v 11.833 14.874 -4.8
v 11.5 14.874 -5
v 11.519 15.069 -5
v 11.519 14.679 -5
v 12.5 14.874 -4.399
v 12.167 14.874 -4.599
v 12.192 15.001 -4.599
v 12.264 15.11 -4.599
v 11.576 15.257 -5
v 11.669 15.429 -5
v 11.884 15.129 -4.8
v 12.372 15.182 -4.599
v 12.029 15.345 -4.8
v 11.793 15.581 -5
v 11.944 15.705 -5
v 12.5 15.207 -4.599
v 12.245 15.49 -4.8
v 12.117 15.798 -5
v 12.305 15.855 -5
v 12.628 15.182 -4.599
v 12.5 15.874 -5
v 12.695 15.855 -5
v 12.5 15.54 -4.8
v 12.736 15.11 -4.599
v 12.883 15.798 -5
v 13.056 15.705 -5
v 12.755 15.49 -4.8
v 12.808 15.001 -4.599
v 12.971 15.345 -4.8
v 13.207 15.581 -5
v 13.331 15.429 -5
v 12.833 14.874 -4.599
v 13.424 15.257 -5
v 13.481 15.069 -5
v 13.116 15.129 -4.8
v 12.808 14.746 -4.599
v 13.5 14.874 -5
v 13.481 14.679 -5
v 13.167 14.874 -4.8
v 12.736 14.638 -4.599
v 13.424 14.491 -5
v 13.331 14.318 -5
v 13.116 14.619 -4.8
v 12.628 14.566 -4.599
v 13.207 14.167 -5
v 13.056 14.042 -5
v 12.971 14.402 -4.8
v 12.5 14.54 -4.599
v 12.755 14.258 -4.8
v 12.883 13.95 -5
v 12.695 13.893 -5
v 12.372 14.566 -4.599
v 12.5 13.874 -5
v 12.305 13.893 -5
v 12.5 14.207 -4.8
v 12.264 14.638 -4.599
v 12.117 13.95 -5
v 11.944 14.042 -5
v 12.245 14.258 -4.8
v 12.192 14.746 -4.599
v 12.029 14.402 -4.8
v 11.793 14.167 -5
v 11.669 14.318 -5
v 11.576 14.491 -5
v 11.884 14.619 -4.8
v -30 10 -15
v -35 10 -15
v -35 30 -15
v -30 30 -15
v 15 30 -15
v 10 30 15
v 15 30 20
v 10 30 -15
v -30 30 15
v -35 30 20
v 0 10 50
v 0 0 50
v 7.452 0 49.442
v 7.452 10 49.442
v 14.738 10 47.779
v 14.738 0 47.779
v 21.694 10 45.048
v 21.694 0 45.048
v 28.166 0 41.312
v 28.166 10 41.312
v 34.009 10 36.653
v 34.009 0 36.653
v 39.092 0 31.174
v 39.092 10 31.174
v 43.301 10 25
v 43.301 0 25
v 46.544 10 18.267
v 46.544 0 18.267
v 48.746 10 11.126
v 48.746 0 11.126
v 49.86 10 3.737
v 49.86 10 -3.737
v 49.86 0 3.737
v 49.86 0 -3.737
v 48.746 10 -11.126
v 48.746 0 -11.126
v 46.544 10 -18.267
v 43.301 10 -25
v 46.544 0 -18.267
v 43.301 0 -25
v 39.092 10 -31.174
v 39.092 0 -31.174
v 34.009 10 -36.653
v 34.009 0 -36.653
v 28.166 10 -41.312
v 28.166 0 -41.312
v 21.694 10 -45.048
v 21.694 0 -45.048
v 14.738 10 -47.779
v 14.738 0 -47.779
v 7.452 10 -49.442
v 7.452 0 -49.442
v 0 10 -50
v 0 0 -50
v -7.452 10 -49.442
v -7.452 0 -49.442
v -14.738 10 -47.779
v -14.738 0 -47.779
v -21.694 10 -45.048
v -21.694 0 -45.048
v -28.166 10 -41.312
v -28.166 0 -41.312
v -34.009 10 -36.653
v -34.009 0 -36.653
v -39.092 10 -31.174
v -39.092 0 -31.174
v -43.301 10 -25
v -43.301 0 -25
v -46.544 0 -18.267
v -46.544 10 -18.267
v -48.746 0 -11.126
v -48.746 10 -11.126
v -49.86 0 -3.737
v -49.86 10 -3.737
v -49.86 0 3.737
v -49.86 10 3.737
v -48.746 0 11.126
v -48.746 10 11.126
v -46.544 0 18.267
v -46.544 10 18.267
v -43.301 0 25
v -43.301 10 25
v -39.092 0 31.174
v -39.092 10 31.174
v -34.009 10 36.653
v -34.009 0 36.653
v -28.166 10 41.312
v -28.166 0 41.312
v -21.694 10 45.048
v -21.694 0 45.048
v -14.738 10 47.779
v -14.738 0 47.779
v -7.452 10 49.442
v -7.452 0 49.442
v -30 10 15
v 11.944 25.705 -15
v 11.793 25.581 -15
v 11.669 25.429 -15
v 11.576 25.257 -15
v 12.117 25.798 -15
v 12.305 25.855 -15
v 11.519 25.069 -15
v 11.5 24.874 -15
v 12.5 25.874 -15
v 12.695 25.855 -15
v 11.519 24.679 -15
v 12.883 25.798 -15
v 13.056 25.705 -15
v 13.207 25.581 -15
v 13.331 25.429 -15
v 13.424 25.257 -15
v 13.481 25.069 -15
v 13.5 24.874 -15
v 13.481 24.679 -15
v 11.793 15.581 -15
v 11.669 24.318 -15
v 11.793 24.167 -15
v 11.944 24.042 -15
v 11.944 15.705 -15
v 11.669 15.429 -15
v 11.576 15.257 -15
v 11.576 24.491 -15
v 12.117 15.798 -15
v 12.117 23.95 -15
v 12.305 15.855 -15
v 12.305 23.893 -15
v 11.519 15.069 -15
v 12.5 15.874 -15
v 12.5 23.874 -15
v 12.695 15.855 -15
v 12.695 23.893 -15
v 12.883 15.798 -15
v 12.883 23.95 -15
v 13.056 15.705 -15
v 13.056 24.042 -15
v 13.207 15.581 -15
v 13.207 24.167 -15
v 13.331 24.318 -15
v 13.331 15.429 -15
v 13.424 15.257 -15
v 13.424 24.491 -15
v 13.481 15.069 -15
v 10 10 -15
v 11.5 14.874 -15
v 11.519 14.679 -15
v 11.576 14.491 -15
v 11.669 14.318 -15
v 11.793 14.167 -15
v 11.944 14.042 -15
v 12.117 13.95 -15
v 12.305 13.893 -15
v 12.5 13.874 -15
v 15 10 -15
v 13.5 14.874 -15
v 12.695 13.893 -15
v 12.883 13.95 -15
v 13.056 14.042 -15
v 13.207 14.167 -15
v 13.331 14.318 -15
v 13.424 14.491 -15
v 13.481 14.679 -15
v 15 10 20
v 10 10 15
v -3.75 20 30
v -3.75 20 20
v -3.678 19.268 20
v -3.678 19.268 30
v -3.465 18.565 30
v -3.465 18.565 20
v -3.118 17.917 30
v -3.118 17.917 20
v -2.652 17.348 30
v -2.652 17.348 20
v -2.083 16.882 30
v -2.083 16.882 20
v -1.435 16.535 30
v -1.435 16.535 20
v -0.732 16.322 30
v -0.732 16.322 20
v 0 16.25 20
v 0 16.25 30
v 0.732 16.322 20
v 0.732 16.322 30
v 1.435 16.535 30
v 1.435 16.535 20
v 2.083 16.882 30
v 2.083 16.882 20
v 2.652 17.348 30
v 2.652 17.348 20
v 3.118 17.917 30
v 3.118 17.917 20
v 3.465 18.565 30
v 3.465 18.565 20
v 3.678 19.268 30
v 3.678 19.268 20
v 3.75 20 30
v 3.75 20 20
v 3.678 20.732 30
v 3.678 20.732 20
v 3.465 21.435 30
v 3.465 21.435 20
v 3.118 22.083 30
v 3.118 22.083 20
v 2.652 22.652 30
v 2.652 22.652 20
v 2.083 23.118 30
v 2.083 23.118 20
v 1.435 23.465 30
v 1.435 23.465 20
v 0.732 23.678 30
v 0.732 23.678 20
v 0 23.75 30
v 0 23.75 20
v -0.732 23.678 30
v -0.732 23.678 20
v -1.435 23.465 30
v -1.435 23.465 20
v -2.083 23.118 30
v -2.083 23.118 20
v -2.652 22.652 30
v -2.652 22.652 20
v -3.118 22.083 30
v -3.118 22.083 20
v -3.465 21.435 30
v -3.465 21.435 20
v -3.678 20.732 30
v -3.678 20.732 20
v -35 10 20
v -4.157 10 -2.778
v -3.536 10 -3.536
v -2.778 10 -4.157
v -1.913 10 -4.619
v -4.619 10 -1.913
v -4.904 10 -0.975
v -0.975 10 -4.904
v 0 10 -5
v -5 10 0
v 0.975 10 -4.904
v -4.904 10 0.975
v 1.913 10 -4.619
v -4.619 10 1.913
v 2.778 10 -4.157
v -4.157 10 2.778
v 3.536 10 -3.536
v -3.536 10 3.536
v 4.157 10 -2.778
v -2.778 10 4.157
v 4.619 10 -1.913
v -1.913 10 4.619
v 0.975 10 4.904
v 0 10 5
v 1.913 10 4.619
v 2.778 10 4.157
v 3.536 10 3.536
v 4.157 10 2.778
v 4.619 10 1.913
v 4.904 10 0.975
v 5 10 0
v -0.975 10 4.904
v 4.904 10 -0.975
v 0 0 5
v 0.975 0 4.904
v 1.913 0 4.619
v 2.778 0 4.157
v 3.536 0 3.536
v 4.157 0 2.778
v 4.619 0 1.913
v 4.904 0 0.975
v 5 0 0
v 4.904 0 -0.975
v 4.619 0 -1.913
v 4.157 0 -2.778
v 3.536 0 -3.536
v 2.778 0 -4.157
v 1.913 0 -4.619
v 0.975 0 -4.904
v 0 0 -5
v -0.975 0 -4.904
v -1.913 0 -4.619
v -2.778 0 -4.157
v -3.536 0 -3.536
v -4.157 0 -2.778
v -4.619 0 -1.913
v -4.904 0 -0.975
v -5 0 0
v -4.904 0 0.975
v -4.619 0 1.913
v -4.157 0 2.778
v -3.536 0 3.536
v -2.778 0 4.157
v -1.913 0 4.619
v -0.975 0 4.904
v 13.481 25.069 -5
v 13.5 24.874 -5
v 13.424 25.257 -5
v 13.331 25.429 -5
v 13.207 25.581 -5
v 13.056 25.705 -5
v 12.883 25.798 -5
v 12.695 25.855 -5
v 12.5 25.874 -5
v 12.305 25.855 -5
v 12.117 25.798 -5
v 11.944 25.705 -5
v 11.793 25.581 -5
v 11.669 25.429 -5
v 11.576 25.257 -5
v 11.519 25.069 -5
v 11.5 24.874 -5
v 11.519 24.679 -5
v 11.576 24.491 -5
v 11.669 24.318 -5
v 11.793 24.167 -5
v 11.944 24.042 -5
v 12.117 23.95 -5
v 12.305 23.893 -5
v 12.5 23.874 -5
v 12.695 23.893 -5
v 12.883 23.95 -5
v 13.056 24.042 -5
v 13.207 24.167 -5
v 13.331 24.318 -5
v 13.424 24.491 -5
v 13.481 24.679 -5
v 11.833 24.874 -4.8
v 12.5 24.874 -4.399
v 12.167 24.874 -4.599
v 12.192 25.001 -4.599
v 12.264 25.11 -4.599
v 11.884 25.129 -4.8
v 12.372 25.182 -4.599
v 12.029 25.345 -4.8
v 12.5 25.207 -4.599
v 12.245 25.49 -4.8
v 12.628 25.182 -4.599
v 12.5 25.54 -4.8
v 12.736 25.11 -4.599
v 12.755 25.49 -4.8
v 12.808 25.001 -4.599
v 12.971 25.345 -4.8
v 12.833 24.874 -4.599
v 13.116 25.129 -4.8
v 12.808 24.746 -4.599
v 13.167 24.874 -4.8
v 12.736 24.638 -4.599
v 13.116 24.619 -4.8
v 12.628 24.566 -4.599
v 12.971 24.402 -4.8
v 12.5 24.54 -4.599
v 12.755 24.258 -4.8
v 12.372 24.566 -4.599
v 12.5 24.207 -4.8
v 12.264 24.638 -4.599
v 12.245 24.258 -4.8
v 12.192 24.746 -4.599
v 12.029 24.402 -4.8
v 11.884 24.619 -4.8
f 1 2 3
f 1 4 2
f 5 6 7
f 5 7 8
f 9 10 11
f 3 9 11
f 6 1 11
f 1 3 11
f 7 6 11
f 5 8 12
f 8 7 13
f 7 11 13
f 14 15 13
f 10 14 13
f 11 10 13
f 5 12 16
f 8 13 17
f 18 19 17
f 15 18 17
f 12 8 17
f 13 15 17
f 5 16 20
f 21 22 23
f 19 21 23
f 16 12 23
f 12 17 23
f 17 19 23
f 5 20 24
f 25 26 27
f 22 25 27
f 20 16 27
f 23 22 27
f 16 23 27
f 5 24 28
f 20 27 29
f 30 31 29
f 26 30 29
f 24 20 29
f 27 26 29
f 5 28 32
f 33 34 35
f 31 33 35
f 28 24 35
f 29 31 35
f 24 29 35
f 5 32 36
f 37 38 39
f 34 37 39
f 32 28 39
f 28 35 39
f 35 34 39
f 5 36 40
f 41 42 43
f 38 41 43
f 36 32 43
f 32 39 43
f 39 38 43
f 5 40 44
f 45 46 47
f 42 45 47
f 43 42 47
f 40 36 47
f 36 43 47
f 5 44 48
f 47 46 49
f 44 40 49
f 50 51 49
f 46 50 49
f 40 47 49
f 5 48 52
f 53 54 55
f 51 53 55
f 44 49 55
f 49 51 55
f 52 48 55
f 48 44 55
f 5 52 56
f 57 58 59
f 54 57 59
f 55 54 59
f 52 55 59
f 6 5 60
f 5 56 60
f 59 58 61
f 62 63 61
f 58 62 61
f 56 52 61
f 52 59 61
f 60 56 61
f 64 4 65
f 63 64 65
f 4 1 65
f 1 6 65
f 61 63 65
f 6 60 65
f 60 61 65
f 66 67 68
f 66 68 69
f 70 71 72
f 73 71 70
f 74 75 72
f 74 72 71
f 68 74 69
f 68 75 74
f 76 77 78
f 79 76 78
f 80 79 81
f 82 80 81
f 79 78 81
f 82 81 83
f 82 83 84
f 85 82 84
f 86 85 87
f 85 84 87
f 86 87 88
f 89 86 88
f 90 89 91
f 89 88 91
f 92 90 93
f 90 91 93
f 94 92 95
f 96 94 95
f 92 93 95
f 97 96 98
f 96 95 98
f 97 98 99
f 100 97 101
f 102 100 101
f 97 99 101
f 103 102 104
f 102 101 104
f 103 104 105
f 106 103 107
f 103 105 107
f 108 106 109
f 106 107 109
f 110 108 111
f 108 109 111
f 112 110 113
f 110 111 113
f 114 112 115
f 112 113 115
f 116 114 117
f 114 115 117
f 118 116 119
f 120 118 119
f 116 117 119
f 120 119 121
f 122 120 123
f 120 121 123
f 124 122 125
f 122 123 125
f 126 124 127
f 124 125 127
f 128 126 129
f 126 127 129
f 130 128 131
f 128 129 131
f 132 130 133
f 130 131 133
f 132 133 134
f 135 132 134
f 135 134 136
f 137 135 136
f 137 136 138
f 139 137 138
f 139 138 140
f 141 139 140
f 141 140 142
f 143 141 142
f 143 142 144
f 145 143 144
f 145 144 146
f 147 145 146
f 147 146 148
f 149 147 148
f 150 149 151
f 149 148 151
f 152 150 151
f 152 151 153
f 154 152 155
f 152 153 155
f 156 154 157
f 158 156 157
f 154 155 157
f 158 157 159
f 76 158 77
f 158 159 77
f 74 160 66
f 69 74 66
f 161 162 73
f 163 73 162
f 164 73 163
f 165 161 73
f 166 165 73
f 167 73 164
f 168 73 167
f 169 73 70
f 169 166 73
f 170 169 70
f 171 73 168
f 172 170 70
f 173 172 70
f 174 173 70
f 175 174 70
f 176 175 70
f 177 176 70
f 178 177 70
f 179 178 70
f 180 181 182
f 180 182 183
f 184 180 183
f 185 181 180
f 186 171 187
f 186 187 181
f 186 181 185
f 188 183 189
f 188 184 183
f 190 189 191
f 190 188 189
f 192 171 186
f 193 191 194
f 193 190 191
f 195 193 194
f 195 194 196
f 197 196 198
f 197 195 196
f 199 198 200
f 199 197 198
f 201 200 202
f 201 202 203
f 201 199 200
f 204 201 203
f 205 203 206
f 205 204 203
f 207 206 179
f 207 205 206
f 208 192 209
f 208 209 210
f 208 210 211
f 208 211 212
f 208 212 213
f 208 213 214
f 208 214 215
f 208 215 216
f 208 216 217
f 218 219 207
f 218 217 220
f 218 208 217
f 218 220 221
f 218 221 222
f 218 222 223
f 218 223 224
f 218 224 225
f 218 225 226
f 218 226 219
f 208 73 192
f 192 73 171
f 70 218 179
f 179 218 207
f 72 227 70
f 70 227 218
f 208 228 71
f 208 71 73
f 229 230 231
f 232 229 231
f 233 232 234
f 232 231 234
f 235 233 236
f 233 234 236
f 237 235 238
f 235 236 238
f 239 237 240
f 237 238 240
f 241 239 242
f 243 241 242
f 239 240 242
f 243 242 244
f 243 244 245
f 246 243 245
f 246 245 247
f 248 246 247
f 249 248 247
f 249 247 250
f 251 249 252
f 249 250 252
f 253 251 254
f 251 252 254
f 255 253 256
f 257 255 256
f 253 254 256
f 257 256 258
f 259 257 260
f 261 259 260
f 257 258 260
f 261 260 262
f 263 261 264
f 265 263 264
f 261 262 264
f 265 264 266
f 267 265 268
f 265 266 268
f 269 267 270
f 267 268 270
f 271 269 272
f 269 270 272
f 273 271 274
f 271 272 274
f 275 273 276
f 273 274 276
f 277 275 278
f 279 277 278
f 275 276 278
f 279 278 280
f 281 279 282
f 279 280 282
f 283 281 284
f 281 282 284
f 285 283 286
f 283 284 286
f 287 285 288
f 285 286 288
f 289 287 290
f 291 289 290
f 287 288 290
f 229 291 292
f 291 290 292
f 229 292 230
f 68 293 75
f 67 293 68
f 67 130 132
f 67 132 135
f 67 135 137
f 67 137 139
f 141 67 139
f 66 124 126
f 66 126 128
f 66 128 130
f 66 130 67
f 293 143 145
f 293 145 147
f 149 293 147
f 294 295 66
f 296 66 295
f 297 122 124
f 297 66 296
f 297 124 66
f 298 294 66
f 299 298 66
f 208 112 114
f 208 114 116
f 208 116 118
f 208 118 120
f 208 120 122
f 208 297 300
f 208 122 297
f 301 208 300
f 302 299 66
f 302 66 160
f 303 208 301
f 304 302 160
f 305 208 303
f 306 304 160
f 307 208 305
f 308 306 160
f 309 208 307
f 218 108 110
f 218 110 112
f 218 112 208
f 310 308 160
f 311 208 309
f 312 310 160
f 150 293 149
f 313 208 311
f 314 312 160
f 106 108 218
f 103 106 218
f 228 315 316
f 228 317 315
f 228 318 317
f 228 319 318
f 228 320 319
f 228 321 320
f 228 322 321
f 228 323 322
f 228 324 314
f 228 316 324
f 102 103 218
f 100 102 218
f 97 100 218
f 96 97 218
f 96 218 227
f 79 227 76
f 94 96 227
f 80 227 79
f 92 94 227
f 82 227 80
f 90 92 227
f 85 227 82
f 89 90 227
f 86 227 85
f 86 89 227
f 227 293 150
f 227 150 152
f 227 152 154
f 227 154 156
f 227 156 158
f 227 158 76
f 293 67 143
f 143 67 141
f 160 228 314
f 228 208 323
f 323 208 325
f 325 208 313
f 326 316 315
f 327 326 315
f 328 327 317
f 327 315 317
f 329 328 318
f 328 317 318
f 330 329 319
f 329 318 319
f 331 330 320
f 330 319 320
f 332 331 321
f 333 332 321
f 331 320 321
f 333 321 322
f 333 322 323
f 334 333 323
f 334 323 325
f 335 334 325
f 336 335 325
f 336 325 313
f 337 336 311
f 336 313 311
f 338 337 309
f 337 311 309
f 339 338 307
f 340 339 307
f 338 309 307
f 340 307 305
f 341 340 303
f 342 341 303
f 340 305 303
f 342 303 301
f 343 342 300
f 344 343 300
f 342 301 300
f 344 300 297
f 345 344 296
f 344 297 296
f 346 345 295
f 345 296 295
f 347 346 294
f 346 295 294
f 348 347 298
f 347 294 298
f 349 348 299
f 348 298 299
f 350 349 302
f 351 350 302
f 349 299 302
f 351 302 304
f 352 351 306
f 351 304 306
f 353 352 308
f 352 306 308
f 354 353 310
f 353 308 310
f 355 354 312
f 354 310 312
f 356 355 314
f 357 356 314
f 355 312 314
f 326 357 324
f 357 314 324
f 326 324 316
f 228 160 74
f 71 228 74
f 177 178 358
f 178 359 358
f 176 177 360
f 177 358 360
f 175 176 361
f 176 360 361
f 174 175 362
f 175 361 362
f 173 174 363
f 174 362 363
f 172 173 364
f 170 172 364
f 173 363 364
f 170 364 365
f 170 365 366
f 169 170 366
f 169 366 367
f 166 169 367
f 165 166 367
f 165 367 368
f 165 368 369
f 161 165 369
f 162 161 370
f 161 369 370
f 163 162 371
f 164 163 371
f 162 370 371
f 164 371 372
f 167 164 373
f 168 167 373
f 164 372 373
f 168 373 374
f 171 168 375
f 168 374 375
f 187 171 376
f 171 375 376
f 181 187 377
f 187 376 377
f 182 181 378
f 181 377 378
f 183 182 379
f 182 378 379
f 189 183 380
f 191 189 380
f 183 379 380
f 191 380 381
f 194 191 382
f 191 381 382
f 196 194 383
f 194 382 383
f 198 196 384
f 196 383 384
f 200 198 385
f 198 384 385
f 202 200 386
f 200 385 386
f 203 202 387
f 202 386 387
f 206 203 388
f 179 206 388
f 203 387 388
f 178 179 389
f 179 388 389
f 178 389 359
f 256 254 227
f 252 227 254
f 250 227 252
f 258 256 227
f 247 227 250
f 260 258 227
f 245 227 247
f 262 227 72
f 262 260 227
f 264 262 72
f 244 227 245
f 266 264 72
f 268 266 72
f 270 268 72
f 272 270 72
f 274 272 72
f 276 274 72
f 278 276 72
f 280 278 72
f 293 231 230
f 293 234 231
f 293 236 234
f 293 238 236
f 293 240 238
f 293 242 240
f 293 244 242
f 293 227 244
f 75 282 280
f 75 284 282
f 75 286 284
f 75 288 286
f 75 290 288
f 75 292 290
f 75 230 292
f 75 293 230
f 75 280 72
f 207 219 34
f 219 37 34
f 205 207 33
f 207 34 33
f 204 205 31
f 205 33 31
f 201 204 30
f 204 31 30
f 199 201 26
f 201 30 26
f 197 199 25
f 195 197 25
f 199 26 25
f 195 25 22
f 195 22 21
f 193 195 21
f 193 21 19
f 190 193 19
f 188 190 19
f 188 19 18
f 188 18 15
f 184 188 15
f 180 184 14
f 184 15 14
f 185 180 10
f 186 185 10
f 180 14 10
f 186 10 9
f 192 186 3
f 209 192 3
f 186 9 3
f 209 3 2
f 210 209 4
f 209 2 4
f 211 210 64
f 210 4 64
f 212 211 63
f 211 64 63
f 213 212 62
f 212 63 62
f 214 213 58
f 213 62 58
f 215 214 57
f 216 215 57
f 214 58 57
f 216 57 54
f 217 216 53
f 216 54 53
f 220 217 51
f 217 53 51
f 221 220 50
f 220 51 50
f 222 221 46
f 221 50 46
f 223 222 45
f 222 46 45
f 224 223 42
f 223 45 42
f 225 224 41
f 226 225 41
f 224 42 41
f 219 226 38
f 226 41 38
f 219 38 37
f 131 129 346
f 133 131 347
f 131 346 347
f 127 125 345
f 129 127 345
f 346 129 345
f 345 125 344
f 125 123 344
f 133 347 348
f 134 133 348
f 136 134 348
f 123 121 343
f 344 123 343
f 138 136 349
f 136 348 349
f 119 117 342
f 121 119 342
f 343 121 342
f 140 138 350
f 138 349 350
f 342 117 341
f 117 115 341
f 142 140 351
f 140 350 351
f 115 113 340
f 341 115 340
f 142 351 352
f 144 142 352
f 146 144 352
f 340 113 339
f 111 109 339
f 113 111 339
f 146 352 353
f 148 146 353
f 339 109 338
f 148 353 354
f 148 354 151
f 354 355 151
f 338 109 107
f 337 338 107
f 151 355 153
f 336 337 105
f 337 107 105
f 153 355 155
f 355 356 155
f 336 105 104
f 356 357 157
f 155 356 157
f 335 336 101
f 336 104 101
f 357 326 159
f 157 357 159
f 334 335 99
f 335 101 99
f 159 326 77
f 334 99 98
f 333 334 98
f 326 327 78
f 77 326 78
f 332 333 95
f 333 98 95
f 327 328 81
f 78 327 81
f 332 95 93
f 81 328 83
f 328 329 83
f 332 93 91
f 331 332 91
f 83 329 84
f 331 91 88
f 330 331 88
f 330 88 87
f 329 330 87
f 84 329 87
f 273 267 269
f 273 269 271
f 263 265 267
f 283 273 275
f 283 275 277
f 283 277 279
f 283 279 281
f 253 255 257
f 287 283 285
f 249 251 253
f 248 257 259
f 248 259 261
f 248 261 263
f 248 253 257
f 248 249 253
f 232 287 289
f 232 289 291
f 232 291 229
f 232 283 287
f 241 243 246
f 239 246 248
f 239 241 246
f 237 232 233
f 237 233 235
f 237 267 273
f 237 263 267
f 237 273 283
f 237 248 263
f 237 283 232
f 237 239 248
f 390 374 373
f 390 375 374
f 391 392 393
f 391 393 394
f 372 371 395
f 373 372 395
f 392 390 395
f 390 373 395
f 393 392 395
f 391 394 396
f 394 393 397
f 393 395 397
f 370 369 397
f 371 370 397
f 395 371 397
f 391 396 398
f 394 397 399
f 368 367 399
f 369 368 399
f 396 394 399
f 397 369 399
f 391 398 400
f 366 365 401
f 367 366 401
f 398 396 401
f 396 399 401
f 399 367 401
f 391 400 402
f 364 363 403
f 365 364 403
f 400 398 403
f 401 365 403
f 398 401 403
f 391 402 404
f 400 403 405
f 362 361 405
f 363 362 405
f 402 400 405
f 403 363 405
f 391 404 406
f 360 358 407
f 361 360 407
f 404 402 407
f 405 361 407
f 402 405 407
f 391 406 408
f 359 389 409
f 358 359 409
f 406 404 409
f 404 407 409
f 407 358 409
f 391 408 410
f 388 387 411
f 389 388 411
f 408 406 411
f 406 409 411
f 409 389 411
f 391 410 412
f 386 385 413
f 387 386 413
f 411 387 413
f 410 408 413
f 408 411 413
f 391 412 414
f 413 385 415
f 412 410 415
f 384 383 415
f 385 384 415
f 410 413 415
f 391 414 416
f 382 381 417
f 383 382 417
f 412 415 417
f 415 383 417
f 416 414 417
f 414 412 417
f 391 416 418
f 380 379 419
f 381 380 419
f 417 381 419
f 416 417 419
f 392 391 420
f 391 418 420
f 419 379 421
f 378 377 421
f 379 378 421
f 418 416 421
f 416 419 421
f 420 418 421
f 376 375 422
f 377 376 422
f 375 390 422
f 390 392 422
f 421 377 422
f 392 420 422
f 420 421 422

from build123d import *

# Parameters (mm, degrees)
SKETCH1_R                 = 50
BOSS_EXTRUDE1_DEPTH       = 10
SKETCH2_R                 = 5
CUT_EXTRUDE1_DEPTH        = 10
SKETCH6_W                 = 5
SKETCH6_H                 = 35
BOSS_EXTRUDE4_DEPTH       = 20
SKETCH7_W                 = 5
SKETCH7_H                 = 20
BOSS_EXTRUDE5_DEPTH       = 40
F_2_0MM_DOWEL_HOLE1_D     = 2
F_2_0MM_DOWEL_HOLE1_DEPTH = 10
F_2_0MM_DOWEL_HOLE1_TIP   = 0.600860619
SKETCH12_R                = 3.75
BOSS_EXTRUDE6_DEPTH       = 10


with BuildPart() as part:
    # Sketch1 → Boss-Extrude1 (new body)
    with BuildSketch(Plane(origin=(0, 0, 0), x_dir=(1, 0, 0), z_dir=(0, 1, 0))):
        Circle(SKETCH1_R)
    extrude(amount=BOSS_EXTRUDE1_DEPTH)

    # Sketch2 → Cut-Extrude1 (cut)
    with BuildSketch(Plane(origin=(0, 10, 0), x_dir=(1, 0, 0), z_dir=(0, 1, 0))):
        Circle(SKETCH2_R)
    extrude(amount=-CUT_EXTRUDE1_DEPTH, mode=Mode.SUBTRACT)

    # Sketch6 → Boss-Extrude4 (add)
    with BuildSketch(Plane(origin=(0, 10, 0), x_dir=(1, 0, 0), z_dir=(0, 1, 0))):
        with Locations((12.5, -2.5)):
            Rectangle(SKETCH6_W, SKETCH6_H)
        with Locations((-32.5, -2.5)):
            Rectangle(SKETCH6_W, SKETCH6_H)
    extrude(amount=BOSS_EXTRUDE4_DEPTH)

    # Sketch7 → Boss-Extrude5 (add)
    with BuildSketch(Plane(origin=(-30, 0, 0), x_dir=(0, 0, -1), z_dir=(1, 0, 0))):
        with Locations((-17.5, 20)):
            Rectangle(SKETCH7_W, SKETCH7_H)
    extrude(amount=BOSS_EXTRUDE5_DEPTH)

    # Ø2.0mm Dowel Hole1
    with Locations(Plane(origin=(0, 0, -15), x_dir=(-1, 0, 0), z_dir=(0, 0, -1))):
        with Locations((-12.5, 24.873818091), (-12.5, 14.873818091)):
            Hole(F_2_0MM_DOWEL_HOLE1_D / 2, depth=F_2_0MM_DOWEL_HOLE1_DEPTH)
            with Locations((0, 0, -(F_2_0MM_DOWEL_HOLE1_DEPTH + F_2_0MM_DOWEL_HOLE1_TIP / 2))):  # 118° drill point
                Cone(0, F_2_0MM_DOWEL_HOLE1_D / 2, F_2_0MM_DOWEL_HOLE1_TIP, mode=Mode.SUBTRACT)

    # Sketch12 → Boss-Extrude6 (add)
    with BuildSketch(Plane.XY.offset(20)):
        with Locations((0, 20)):
            Circle(SKETCH12_R)
    extrude(amount=BOSS_EXTRUDE6_DEPTH)


solid = part.part
